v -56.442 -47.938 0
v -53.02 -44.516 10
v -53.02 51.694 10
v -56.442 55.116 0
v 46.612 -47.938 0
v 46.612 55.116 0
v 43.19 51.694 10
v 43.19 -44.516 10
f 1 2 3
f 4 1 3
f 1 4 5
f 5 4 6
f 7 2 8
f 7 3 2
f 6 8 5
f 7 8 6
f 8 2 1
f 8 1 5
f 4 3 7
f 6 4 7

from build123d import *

# Parameters (mm, degrees)
F0_W     = 103.053610972
F0_H     = 103.053610972
F1_DEPTH = 10
F2_SIZE2 = 3.42161
F2_SIZE  = 9.99999
F3_SIZE2 = 3.42161
F3_SIZE  = 9.99999
F4_SIZE2 = 3.42161
F4_SIZE  = 9.99999
F5_SIZE2 = 3.42161
F5_SIZE  = 9.99999


# Not quite as in the source:
# - a fillet or chamfer is up to 0.001 mm smaller than in the source, because OpenCascade refuses the exact size


with BuildPart() as f1:
    # F0 (on Top) → F1 (new body)
    with BuildSketch(Plane.XY):
        with Locations((-4.9147187663, 3.5890949971)):
            Rectangle(F0_W, F0_H)
    extrude(amount=F1_DEPTH)

    # F2 (size 10 and 3.421620486 in the source; OpenCascade refuses exactly that, so slightly less here)
    f2_edges = [f1.edges().sort_by_distance(p)[0] for p in [
        (46.612087, 3.589095, 10),
    ]]
    f2_side = f1.faces().sort_by_distance((46.612087, 3.589095, 5))[0]
    chamfer(f2_edges, length=F2_SIZE, length2=F2_SIZE2, reference=f2_side)

    # F3 (size 10 and 3.421620486 in the source; OpenCascade refuses exactly that, so slightly less here)
    f3_edges = [f1.edges().sort_by_distance(p)[0] for p in [
        (-6.625524, 55.1159, 10),
    ]]
    f3_side = f1.faces().sort_by_distance((-5.765307, 55.1159, 4.971864))[0]
    chamfer(f3_edges, length=F3_SIZE, length2=F3_SIZE2, reference=f3_side)

    # F4 (size 10 and 3.421620486 in the source; OpenCascade refuses exactly that, so slightly less here)
    f4_edges = [f1.edges().sort_by_distance(p)[0] for p in [
        (-6.625524, -47.93771, 10),
    ]]
    f4_side = f1.faces().sort_by_distance((-5.765307, -47.93771, 4.971864))[0]
    chamfer(f4_edges, length=F4_SIZE, length2=F4_SIZE2, reference=f4_side)

    # F5 (size 10 and 3.421620486 in the source; OpenCascade refuses exactly that, so slightly less here)
    f5_edges = [f1.edges().sort_by_distance(p)[0] for p in [
        (-56.441524, 3.589095, 10),
    ]]
    f5_side = f1.faces().sort_by_distance((-56.441524, 3.589095, 4.942762))[0]
    chamfer(f5_edges, length=F5_SIZE, length2=F5_SIZE2, reference=f5_side)


solid = f1.part
